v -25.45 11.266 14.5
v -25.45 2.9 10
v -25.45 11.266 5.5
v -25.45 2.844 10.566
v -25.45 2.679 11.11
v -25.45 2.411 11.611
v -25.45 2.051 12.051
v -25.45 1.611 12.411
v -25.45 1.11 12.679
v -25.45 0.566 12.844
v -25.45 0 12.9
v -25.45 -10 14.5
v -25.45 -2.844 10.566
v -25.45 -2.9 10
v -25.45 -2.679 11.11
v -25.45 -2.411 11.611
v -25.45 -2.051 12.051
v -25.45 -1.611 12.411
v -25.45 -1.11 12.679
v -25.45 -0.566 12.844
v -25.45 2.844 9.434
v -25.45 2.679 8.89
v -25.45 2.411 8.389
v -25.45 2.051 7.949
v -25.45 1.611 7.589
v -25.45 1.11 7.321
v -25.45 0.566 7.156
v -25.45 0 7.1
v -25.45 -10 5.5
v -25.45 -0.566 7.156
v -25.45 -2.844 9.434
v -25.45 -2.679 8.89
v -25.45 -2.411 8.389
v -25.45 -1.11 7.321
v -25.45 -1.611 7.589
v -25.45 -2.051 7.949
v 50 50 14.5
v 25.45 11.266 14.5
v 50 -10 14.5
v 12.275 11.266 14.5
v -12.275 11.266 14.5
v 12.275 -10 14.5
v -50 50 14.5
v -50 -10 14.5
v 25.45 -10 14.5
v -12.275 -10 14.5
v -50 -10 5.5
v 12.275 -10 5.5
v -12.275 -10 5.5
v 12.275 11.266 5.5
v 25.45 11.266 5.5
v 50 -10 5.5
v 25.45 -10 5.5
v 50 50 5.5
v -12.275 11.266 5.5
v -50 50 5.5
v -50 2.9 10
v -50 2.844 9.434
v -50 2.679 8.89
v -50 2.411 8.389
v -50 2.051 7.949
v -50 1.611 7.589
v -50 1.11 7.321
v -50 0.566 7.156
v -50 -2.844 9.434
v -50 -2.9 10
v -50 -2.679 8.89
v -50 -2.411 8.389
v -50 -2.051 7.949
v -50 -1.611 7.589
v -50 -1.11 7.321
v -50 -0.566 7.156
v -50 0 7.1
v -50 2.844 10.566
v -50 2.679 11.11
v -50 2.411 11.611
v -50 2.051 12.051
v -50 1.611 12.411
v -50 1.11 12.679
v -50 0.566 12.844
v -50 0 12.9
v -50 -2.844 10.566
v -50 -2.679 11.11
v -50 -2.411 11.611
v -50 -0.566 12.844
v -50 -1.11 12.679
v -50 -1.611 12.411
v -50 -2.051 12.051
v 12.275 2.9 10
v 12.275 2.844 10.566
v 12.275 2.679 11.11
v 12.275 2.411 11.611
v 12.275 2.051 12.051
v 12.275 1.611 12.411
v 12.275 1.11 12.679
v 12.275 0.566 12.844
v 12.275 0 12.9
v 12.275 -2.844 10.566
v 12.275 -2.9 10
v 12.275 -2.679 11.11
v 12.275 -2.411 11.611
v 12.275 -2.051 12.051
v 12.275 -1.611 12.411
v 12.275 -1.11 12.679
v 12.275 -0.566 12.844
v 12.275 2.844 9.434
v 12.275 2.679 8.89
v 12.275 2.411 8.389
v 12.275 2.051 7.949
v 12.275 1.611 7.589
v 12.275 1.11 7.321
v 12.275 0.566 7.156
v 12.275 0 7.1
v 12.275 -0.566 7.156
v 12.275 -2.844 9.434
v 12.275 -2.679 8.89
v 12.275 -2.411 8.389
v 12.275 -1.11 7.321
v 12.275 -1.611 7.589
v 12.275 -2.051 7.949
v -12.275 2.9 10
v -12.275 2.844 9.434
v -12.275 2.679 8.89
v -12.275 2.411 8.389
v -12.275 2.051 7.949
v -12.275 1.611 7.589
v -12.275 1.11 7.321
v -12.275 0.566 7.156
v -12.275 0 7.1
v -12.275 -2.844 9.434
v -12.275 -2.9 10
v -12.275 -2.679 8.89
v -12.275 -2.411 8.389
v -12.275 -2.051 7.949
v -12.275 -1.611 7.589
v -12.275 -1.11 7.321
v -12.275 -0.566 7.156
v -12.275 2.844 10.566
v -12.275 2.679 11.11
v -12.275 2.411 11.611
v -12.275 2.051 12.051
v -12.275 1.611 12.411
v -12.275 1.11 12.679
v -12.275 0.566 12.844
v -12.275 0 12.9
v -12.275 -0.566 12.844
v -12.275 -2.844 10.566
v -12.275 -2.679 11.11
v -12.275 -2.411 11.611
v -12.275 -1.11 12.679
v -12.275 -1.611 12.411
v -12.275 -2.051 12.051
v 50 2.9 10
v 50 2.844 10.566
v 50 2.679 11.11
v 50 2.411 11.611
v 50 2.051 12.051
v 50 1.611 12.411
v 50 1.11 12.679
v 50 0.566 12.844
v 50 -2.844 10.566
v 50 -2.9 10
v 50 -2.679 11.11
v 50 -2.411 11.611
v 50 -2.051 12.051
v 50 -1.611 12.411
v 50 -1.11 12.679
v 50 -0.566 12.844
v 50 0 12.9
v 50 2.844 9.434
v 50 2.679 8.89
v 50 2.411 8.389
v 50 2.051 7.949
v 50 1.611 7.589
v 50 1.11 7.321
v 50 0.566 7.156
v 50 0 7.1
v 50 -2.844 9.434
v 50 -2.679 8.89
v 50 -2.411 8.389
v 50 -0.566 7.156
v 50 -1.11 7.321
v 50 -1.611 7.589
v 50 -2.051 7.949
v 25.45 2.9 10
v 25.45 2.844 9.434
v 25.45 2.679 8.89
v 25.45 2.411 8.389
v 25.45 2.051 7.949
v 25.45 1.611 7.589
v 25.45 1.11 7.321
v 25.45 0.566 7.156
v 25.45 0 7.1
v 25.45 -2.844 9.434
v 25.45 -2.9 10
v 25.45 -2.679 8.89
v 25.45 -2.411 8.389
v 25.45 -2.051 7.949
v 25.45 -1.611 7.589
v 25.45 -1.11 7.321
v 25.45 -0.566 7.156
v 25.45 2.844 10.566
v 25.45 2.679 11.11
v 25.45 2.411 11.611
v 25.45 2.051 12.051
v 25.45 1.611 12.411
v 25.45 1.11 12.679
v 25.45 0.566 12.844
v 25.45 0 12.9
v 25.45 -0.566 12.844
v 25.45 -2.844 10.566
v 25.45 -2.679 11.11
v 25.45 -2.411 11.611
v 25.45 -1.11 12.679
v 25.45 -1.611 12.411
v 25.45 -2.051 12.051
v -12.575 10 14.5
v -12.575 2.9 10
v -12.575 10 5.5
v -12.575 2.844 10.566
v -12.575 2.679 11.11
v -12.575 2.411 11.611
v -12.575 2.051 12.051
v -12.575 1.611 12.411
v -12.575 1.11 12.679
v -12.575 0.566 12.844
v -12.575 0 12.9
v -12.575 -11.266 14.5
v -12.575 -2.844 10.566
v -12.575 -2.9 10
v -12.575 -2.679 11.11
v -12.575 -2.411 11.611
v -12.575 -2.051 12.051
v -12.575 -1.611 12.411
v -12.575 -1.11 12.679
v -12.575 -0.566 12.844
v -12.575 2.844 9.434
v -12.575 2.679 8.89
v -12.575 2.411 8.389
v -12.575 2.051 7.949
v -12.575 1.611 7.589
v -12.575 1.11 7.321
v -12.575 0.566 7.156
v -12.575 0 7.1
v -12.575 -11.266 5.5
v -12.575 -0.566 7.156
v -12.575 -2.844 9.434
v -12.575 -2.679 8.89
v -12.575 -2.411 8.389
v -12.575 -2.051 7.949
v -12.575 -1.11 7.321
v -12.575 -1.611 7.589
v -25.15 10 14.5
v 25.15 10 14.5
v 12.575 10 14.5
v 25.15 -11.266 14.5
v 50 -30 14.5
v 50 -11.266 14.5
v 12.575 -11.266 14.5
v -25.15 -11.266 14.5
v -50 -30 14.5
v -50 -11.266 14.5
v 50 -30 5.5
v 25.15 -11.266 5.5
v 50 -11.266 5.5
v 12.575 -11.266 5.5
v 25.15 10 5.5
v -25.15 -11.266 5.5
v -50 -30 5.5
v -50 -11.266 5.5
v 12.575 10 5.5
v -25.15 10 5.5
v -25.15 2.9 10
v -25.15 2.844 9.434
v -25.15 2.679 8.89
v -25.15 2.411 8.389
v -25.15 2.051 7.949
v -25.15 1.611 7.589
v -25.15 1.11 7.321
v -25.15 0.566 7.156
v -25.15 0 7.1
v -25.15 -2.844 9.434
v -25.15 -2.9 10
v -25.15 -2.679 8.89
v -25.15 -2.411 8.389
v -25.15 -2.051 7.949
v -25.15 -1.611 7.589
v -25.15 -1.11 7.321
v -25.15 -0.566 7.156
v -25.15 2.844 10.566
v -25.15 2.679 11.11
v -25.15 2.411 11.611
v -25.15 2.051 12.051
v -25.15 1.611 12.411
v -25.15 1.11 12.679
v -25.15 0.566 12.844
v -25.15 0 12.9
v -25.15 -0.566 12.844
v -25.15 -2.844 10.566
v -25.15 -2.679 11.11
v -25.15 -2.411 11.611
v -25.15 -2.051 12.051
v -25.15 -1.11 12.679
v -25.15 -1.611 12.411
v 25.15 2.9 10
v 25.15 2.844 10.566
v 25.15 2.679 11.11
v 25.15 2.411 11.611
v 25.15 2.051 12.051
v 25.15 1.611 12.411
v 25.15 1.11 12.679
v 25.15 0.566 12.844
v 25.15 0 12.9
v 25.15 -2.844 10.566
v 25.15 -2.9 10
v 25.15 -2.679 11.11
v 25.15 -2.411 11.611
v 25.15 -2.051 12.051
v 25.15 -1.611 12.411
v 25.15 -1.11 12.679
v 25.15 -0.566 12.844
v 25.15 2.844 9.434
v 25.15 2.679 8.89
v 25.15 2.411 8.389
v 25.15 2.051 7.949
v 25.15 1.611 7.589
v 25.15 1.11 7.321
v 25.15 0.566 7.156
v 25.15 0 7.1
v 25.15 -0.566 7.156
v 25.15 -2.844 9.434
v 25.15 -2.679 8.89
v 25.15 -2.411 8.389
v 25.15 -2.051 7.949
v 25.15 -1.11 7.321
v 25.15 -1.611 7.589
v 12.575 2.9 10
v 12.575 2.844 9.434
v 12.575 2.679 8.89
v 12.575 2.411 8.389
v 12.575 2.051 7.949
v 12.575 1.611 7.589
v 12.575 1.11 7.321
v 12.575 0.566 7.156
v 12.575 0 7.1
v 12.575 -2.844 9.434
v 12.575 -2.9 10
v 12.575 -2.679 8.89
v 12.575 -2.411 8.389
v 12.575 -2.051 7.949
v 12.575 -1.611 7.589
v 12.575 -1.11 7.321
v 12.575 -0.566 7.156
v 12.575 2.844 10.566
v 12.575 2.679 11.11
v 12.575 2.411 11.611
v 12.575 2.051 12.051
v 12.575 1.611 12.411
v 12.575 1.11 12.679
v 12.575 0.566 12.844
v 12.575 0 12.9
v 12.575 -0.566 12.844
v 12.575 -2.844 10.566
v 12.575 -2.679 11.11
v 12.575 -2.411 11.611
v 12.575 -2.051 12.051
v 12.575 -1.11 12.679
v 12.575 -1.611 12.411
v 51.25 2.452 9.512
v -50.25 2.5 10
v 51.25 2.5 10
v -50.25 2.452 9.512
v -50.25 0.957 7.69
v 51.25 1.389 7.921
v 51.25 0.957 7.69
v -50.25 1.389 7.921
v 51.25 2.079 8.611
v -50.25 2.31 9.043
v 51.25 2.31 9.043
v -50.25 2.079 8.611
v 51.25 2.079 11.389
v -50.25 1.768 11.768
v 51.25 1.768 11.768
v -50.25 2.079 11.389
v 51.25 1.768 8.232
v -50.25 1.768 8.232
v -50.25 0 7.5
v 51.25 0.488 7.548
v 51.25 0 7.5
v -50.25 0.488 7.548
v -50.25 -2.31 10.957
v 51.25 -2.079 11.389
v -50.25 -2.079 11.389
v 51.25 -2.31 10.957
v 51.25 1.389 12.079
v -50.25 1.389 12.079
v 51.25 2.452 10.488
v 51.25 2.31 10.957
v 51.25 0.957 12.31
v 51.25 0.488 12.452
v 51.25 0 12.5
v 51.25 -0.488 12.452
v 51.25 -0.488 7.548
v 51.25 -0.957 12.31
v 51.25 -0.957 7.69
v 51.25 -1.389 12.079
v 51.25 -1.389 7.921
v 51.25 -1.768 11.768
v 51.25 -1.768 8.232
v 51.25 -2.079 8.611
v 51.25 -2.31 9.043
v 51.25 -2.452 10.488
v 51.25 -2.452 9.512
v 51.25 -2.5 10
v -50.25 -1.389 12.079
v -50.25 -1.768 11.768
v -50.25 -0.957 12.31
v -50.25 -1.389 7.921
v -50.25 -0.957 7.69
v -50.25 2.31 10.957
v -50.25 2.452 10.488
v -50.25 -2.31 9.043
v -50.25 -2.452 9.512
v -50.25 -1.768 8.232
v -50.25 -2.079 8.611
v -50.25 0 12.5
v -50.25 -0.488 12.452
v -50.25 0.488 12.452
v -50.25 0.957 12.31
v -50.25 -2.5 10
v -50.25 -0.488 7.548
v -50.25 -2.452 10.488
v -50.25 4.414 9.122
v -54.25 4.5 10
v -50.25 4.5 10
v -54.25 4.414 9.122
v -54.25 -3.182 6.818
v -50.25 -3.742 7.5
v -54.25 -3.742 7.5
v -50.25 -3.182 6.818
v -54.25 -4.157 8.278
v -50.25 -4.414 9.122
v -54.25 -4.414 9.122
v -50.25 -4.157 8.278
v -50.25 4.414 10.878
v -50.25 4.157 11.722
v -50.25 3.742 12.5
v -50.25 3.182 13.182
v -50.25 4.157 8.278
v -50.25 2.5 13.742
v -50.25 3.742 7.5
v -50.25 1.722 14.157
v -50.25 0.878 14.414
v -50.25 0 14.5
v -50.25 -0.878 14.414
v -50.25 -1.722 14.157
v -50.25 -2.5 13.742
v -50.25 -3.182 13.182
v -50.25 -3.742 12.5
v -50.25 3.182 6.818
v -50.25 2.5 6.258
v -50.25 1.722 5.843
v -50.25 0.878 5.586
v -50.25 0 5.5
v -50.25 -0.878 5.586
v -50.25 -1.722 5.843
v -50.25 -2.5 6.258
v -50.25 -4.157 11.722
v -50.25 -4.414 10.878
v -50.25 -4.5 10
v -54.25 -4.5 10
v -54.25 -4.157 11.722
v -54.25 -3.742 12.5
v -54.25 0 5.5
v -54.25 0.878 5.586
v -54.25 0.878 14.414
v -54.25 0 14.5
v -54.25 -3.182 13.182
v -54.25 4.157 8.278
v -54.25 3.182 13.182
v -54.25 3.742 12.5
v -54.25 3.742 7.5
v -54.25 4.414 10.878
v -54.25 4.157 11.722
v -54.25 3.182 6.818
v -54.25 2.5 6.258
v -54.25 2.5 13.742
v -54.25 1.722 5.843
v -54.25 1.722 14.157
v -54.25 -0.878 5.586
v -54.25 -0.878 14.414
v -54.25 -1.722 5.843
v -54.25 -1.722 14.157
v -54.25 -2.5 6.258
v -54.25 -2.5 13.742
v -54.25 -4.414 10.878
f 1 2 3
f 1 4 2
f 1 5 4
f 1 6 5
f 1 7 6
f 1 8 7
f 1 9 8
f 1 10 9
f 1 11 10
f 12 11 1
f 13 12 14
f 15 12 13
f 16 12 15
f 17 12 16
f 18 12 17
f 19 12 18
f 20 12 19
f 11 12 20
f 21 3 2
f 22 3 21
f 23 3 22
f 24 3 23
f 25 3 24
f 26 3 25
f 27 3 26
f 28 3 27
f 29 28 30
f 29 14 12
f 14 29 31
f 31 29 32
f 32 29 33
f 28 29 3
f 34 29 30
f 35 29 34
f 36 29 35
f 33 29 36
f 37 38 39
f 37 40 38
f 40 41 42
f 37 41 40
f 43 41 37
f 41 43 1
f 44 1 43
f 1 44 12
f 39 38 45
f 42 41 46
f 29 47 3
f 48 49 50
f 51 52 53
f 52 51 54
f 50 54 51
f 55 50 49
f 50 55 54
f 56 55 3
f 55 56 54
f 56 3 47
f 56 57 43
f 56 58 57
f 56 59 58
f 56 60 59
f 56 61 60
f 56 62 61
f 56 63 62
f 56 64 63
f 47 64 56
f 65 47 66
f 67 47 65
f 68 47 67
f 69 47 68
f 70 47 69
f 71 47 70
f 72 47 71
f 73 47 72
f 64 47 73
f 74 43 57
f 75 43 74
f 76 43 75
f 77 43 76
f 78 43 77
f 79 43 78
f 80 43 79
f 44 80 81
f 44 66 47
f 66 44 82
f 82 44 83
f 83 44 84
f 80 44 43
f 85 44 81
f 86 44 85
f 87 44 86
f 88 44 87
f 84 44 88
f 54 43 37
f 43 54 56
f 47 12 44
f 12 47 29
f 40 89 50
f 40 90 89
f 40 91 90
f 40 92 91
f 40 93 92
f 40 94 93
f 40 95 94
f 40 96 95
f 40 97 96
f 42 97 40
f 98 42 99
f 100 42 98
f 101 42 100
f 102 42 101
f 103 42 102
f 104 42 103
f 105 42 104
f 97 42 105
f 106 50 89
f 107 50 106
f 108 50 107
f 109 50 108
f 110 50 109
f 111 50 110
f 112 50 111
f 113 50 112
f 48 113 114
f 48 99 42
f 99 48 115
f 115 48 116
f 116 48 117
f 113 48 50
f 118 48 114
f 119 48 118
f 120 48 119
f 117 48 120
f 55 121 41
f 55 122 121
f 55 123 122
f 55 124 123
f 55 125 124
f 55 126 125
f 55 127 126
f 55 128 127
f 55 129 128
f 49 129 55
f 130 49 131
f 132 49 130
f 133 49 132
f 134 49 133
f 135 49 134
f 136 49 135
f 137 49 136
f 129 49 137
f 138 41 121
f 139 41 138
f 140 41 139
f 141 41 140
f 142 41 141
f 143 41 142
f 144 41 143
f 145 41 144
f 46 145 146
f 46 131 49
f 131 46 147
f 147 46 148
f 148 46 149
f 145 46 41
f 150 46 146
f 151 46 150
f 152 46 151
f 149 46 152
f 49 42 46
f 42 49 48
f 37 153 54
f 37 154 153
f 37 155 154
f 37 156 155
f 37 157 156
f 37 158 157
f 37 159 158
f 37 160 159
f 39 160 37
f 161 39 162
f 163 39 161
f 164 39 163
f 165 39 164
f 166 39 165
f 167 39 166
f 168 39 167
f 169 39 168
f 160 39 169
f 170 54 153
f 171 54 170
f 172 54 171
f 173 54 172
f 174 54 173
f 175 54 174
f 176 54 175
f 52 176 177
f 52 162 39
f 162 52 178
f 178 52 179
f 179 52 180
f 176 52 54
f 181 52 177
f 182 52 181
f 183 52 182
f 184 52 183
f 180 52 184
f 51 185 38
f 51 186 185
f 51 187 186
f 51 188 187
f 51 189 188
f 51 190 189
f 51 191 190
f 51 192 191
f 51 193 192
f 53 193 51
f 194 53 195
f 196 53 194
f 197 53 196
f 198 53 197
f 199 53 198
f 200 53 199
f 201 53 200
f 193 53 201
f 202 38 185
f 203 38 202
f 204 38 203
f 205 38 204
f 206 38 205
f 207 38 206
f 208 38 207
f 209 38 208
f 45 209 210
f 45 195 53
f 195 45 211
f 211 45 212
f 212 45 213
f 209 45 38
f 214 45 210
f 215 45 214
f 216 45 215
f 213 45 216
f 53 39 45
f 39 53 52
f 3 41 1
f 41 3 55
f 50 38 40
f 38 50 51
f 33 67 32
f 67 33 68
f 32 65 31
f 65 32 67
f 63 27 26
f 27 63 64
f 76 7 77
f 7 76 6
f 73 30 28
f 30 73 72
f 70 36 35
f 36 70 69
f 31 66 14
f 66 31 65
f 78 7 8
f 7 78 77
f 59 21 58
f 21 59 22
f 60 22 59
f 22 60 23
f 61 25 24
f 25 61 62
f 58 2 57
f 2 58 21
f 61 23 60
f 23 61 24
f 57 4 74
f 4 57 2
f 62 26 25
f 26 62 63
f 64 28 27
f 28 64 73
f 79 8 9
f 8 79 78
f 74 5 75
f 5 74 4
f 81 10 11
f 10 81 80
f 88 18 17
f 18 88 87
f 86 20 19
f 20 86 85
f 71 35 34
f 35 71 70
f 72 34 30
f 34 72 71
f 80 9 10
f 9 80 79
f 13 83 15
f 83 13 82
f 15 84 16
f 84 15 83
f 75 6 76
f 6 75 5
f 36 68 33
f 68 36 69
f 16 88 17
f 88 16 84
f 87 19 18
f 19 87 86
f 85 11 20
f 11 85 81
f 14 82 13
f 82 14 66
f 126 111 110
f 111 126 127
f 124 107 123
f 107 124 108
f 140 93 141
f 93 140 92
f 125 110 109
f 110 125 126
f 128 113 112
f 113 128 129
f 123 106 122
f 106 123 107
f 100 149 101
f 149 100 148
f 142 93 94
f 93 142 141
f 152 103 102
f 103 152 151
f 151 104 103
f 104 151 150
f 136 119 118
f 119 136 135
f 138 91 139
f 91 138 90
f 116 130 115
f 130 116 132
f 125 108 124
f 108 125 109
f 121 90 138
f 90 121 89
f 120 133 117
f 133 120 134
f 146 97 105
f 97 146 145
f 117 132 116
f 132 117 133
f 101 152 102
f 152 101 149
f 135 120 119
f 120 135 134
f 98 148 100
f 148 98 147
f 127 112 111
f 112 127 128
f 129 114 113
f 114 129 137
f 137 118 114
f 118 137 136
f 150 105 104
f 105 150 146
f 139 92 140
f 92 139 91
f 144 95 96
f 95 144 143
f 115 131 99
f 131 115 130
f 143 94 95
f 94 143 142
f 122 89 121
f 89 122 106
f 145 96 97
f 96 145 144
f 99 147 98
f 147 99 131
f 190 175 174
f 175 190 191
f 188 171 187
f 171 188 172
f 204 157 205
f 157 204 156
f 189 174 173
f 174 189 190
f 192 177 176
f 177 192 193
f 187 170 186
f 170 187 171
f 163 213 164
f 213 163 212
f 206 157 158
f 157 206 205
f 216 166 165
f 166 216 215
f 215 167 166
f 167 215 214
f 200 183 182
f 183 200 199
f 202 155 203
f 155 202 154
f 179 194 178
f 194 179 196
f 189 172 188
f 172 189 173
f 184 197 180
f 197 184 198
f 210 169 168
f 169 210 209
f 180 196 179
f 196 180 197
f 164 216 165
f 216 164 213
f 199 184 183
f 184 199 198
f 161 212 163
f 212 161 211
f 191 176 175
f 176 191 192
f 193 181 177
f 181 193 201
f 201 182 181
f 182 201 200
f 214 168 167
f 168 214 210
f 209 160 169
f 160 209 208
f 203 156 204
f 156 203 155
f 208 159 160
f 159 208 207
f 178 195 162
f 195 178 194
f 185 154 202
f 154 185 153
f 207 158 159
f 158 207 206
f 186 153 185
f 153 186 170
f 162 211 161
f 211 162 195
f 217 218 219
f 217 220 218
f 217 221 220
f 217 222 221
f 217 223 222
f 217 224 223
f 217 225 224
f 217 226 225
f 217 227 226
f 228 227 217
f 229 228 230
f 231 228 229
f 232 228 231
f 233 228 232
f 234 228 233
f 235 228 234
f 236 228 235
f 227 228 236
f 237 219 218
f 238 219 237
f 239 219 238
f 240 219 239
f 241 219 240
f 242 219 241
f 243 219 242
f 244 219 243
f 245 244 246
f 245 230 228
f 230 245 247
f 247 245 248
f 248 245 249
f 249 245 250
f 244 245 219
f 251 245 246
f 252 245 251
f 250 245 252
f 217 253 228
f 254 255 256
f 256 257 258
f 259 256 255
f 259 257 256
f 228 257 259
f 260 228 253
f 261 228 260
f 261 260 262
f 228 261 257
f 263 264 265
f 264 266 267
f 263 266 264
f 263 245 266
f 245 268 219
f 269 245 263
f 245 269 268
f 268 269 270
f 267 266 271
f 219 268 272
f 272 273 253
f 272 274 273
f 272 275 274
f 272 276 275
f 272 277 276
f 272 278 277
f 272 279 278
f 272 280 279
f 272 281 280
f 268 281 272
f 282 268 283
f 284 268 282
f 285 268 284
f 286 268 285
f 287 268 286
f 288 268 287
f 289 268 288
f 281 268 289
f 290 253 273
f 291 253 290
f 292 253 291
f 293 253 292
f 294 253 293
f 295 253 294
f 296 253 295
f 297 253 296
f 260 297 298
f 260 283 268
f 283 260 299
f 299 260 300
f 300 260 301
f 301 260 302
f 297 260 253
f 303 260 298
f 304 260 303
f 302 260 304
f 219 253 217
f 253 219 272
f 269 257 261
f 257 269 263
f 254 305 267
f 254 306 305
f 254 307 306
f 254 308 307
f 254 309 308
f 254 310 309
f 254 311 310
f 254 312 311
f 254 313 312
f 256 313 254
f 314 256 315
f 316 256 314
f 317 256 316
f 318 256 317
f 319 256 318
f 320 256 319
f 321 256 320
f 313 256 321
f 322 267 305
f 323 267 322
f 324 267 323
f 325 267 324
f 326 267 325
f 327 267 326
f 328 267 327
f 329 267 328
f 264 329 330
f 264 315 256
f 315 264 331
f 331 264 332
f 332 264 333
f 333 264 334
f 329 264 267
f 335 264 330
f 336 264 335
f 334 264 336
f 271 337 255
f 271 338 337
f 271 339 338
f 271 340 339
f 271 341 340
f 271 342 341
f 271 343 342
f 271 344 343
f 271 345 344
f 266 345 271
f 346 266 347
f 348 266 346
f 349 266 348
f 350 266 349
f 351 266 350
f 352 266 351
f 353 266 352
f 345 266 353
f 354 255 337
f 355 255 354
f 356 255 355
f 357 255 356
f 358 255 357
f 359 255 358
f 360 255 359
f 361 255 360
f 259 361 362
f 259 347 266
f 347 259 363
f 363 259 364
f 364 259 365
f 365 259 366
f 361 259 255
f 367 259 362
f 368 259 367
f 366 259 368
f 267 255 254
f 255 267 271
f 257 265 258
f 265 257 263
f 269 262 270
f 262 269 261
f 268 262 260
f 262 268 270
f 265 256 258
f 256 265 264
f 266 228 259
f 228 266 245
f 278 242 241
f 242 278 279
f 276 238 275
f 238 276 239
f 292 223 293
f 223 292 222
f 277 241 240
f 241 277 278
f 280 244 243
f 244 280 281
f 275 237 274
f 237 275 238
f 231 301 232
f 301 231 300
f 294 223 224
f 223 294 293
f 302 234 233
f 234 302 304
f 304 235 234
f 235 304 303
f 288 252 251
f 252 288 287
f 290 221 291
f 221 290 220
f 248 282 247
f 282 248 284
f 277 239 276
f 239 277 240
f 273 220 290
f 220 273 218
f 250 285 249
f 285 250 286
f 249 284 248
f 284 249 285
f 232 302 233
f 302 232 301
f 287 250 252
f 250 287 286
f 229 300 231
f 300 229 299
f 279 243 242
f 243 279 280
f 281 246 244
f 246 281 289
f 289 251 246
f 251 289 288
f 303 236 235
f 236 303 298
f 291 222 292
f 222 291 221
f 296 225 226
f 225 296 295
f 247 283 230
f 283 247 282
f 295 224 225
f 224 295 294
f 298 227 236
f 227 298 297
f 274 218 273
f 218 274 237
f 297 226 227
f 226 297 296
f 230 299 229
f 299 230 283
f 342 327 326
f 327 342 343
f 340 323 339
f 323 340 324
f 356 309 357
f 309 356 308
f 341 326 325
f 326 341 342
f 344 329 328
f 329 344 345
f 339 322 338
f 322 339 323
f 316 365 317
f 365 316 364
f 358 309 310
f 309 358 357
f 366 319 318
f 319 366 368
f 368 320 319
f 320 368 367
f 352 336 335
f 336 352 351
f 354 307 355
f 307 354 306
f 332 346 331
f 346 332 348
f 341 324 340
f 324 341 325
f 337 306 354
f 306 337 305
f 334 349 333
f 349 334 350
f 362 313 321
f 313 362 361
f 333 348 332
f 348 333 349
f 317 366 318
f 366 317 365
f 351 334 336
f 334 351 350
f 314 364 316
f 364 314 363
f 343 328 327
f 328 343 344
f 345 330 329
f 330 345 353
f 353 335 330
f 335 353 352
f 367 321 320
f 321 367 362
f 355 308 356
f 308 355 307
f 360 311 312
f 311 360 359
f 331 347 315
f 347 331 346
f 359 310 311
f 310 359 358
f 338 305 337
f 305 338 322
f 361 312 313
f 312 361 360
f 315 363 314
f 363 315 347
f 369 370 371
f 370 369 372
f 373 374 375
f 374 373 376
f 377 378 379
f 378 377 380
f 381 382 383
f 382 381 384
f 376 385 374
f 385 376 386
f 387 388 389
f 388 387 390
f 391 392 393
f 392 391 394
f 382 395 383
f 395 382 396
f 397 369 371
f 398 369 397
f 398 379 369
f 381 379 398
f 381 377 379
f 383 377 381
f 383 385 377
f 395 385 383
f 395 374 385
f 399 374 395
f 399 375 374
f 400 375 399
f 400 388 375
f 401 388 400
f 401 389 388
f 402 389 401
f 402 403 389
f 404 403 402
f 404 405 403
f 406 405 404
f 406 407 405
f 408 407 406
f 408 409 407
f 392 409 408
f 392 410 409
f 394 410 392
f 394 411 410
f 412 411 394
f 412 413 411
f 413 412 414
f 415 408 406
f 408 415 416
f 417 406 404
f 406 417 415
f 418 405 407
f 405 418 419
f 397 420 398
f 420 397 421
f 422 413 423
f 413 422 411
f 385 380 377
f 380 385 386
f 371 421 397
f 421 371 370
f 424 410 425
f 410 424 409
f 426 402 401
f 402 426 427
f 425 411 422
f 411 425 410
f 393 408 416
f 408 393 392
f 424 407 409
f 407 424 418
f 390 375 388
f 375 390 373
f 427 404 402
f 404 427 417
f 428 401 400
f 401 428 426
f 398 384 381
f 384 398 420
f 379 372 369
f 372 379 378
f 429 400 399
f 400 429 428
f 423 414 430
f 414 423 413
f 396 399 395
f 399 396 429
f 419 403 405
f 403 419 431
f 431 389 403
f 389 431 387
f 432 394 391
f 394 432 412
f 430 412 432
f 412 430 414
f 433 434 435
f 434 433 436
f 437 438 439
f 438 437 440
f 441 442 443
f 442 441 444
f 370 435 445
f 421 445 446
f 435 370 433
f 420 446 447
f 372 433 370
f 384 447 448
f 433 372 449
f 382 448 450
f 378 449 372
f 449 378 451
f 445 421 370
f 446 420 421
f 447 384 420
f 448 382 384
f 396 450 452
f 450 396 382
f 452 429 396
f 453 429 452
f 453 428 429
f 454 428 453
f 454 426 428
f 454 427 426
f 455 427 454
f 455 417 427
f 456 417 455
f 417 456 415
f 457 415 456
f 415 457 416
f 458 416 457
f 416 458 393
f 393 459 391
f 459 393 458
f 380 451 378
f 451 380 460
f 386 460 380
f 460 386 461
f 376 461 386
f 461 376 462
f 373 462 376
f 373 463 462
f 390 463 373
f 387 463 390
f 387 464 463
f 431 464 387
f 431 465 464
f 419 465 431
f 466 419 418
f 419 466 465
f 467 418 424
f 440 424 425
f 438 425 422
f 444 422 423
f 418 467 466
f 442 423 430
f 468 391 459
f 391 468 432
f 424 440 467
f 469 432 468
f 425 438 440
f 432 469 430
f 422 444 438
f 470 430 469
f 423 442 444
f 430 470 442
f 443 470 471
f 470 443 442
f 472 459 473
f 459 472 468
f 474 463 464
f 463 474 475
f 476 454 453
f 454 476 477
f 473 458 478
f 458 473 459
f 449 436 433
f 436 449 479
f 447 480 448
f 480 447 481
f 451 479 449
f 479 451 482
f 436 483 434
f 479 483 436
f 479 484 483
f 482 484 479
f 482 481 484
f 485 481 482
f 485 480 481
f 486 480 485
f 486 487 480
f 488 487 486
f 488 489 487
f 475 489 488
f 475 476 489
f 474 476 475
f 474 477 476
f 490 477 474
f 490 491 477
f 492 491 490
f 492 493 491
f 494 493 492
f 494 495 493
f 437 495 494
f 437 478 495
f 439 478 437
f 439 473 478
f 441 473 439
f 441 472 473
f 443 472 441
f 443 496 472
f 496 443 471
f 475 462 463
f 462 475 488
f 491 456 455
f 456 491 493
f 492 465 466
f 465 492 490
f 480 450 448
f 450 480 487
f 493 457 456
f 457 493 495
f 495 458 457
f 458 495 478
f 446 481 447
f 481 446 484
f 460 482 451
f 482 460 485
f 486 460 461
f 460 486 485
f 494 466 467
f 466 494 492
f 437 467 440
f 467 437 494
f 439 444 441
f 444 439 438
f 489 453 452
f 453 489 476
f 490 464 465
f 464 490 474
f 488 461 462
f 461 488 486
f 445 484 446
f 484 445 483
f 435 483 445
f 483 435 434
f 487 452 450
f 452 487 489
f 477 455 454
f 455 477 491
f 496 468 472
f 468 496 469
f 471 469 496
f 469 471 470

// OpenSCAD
$fn = 32;

// ------------------------------------------------------------------------
// Butt hinge: hinge 100 mm, leaf swung 0 deg
// Every part is its own module, assembly() places every instance.
// ------------------------------------------------------------------------

// --- part 1 ---
module hinge_base() {
  difference() {
    union() {
      translate([-50, -10, -4.5]) cube([24.55, 60, 9]);
      translate([-12.275, -10, -4.5]) cube([24.55, 60, 9]);
      translate([25.45, -10, -4.5]) cube([24.55, 60, 9]);
      translate([-50, 11.266, -4.5]) cube([100, 38.734, 9]);
    }
    translate([-37.725, 0, 0]) rotate([0, 90, 0]) cylinder(h = 26.55, d = 5.8, center = true);
    translate([0, 0, 0]) rotate([0, 90, 0]) cylinder(h = 26.55, d = 5.8, center = true);
    translate([37.725, 0, 0]) rotate([0, 90, 0]) cylinder(h = 26.55, d = 5.8, center = true);
  }
}

// --- part 2 ---
module hinge_mover() {
  difference() {
    union() {
      translate([-25.15, -30, -4.5]) cube([12.575, 40, 9]);
      translate([12.575, -30, -4.5]) cube([12.575, 40, 9]);
      translate([-50, -30, -4.5]) cube([100, 18.734, 9]);
    }
    translate([-18.863, 0, 0]) rotate([0, 90, 0]) cylinder(h = 14.575, d = 5.8, center = true);
    translate([18.863, 0, 0]) rotate([0, 90, 0]) cylinder(h = 14.575, d = 5.8, center = true);
  }
}

// --- part 3 ---
module hinge_pin() {
  rotate([0, 90, 0]) cylinder(h = 102.5, d = 5, center = true);
  translate([-54.25, 0, 0]) rotate([0, 90, 0]) cylinder(h = 4, d = 9);
}

// --- assembly ---
module assembly() {
  color([0.80, 0.24, 0.20]) translate([0, 0, 10]) rotate([0, 0, 0]) hinge_base();
  color([0.20, 0.45, 0.75]) translate([0, 0, 10]) rotate([0, 0, 0]) hinge_mover();
  color([0.25, 0.62, 0.32]) translate([0, 0, 10]) rotate([0, 0, 0]) hinge_pin();
}

assembly();
